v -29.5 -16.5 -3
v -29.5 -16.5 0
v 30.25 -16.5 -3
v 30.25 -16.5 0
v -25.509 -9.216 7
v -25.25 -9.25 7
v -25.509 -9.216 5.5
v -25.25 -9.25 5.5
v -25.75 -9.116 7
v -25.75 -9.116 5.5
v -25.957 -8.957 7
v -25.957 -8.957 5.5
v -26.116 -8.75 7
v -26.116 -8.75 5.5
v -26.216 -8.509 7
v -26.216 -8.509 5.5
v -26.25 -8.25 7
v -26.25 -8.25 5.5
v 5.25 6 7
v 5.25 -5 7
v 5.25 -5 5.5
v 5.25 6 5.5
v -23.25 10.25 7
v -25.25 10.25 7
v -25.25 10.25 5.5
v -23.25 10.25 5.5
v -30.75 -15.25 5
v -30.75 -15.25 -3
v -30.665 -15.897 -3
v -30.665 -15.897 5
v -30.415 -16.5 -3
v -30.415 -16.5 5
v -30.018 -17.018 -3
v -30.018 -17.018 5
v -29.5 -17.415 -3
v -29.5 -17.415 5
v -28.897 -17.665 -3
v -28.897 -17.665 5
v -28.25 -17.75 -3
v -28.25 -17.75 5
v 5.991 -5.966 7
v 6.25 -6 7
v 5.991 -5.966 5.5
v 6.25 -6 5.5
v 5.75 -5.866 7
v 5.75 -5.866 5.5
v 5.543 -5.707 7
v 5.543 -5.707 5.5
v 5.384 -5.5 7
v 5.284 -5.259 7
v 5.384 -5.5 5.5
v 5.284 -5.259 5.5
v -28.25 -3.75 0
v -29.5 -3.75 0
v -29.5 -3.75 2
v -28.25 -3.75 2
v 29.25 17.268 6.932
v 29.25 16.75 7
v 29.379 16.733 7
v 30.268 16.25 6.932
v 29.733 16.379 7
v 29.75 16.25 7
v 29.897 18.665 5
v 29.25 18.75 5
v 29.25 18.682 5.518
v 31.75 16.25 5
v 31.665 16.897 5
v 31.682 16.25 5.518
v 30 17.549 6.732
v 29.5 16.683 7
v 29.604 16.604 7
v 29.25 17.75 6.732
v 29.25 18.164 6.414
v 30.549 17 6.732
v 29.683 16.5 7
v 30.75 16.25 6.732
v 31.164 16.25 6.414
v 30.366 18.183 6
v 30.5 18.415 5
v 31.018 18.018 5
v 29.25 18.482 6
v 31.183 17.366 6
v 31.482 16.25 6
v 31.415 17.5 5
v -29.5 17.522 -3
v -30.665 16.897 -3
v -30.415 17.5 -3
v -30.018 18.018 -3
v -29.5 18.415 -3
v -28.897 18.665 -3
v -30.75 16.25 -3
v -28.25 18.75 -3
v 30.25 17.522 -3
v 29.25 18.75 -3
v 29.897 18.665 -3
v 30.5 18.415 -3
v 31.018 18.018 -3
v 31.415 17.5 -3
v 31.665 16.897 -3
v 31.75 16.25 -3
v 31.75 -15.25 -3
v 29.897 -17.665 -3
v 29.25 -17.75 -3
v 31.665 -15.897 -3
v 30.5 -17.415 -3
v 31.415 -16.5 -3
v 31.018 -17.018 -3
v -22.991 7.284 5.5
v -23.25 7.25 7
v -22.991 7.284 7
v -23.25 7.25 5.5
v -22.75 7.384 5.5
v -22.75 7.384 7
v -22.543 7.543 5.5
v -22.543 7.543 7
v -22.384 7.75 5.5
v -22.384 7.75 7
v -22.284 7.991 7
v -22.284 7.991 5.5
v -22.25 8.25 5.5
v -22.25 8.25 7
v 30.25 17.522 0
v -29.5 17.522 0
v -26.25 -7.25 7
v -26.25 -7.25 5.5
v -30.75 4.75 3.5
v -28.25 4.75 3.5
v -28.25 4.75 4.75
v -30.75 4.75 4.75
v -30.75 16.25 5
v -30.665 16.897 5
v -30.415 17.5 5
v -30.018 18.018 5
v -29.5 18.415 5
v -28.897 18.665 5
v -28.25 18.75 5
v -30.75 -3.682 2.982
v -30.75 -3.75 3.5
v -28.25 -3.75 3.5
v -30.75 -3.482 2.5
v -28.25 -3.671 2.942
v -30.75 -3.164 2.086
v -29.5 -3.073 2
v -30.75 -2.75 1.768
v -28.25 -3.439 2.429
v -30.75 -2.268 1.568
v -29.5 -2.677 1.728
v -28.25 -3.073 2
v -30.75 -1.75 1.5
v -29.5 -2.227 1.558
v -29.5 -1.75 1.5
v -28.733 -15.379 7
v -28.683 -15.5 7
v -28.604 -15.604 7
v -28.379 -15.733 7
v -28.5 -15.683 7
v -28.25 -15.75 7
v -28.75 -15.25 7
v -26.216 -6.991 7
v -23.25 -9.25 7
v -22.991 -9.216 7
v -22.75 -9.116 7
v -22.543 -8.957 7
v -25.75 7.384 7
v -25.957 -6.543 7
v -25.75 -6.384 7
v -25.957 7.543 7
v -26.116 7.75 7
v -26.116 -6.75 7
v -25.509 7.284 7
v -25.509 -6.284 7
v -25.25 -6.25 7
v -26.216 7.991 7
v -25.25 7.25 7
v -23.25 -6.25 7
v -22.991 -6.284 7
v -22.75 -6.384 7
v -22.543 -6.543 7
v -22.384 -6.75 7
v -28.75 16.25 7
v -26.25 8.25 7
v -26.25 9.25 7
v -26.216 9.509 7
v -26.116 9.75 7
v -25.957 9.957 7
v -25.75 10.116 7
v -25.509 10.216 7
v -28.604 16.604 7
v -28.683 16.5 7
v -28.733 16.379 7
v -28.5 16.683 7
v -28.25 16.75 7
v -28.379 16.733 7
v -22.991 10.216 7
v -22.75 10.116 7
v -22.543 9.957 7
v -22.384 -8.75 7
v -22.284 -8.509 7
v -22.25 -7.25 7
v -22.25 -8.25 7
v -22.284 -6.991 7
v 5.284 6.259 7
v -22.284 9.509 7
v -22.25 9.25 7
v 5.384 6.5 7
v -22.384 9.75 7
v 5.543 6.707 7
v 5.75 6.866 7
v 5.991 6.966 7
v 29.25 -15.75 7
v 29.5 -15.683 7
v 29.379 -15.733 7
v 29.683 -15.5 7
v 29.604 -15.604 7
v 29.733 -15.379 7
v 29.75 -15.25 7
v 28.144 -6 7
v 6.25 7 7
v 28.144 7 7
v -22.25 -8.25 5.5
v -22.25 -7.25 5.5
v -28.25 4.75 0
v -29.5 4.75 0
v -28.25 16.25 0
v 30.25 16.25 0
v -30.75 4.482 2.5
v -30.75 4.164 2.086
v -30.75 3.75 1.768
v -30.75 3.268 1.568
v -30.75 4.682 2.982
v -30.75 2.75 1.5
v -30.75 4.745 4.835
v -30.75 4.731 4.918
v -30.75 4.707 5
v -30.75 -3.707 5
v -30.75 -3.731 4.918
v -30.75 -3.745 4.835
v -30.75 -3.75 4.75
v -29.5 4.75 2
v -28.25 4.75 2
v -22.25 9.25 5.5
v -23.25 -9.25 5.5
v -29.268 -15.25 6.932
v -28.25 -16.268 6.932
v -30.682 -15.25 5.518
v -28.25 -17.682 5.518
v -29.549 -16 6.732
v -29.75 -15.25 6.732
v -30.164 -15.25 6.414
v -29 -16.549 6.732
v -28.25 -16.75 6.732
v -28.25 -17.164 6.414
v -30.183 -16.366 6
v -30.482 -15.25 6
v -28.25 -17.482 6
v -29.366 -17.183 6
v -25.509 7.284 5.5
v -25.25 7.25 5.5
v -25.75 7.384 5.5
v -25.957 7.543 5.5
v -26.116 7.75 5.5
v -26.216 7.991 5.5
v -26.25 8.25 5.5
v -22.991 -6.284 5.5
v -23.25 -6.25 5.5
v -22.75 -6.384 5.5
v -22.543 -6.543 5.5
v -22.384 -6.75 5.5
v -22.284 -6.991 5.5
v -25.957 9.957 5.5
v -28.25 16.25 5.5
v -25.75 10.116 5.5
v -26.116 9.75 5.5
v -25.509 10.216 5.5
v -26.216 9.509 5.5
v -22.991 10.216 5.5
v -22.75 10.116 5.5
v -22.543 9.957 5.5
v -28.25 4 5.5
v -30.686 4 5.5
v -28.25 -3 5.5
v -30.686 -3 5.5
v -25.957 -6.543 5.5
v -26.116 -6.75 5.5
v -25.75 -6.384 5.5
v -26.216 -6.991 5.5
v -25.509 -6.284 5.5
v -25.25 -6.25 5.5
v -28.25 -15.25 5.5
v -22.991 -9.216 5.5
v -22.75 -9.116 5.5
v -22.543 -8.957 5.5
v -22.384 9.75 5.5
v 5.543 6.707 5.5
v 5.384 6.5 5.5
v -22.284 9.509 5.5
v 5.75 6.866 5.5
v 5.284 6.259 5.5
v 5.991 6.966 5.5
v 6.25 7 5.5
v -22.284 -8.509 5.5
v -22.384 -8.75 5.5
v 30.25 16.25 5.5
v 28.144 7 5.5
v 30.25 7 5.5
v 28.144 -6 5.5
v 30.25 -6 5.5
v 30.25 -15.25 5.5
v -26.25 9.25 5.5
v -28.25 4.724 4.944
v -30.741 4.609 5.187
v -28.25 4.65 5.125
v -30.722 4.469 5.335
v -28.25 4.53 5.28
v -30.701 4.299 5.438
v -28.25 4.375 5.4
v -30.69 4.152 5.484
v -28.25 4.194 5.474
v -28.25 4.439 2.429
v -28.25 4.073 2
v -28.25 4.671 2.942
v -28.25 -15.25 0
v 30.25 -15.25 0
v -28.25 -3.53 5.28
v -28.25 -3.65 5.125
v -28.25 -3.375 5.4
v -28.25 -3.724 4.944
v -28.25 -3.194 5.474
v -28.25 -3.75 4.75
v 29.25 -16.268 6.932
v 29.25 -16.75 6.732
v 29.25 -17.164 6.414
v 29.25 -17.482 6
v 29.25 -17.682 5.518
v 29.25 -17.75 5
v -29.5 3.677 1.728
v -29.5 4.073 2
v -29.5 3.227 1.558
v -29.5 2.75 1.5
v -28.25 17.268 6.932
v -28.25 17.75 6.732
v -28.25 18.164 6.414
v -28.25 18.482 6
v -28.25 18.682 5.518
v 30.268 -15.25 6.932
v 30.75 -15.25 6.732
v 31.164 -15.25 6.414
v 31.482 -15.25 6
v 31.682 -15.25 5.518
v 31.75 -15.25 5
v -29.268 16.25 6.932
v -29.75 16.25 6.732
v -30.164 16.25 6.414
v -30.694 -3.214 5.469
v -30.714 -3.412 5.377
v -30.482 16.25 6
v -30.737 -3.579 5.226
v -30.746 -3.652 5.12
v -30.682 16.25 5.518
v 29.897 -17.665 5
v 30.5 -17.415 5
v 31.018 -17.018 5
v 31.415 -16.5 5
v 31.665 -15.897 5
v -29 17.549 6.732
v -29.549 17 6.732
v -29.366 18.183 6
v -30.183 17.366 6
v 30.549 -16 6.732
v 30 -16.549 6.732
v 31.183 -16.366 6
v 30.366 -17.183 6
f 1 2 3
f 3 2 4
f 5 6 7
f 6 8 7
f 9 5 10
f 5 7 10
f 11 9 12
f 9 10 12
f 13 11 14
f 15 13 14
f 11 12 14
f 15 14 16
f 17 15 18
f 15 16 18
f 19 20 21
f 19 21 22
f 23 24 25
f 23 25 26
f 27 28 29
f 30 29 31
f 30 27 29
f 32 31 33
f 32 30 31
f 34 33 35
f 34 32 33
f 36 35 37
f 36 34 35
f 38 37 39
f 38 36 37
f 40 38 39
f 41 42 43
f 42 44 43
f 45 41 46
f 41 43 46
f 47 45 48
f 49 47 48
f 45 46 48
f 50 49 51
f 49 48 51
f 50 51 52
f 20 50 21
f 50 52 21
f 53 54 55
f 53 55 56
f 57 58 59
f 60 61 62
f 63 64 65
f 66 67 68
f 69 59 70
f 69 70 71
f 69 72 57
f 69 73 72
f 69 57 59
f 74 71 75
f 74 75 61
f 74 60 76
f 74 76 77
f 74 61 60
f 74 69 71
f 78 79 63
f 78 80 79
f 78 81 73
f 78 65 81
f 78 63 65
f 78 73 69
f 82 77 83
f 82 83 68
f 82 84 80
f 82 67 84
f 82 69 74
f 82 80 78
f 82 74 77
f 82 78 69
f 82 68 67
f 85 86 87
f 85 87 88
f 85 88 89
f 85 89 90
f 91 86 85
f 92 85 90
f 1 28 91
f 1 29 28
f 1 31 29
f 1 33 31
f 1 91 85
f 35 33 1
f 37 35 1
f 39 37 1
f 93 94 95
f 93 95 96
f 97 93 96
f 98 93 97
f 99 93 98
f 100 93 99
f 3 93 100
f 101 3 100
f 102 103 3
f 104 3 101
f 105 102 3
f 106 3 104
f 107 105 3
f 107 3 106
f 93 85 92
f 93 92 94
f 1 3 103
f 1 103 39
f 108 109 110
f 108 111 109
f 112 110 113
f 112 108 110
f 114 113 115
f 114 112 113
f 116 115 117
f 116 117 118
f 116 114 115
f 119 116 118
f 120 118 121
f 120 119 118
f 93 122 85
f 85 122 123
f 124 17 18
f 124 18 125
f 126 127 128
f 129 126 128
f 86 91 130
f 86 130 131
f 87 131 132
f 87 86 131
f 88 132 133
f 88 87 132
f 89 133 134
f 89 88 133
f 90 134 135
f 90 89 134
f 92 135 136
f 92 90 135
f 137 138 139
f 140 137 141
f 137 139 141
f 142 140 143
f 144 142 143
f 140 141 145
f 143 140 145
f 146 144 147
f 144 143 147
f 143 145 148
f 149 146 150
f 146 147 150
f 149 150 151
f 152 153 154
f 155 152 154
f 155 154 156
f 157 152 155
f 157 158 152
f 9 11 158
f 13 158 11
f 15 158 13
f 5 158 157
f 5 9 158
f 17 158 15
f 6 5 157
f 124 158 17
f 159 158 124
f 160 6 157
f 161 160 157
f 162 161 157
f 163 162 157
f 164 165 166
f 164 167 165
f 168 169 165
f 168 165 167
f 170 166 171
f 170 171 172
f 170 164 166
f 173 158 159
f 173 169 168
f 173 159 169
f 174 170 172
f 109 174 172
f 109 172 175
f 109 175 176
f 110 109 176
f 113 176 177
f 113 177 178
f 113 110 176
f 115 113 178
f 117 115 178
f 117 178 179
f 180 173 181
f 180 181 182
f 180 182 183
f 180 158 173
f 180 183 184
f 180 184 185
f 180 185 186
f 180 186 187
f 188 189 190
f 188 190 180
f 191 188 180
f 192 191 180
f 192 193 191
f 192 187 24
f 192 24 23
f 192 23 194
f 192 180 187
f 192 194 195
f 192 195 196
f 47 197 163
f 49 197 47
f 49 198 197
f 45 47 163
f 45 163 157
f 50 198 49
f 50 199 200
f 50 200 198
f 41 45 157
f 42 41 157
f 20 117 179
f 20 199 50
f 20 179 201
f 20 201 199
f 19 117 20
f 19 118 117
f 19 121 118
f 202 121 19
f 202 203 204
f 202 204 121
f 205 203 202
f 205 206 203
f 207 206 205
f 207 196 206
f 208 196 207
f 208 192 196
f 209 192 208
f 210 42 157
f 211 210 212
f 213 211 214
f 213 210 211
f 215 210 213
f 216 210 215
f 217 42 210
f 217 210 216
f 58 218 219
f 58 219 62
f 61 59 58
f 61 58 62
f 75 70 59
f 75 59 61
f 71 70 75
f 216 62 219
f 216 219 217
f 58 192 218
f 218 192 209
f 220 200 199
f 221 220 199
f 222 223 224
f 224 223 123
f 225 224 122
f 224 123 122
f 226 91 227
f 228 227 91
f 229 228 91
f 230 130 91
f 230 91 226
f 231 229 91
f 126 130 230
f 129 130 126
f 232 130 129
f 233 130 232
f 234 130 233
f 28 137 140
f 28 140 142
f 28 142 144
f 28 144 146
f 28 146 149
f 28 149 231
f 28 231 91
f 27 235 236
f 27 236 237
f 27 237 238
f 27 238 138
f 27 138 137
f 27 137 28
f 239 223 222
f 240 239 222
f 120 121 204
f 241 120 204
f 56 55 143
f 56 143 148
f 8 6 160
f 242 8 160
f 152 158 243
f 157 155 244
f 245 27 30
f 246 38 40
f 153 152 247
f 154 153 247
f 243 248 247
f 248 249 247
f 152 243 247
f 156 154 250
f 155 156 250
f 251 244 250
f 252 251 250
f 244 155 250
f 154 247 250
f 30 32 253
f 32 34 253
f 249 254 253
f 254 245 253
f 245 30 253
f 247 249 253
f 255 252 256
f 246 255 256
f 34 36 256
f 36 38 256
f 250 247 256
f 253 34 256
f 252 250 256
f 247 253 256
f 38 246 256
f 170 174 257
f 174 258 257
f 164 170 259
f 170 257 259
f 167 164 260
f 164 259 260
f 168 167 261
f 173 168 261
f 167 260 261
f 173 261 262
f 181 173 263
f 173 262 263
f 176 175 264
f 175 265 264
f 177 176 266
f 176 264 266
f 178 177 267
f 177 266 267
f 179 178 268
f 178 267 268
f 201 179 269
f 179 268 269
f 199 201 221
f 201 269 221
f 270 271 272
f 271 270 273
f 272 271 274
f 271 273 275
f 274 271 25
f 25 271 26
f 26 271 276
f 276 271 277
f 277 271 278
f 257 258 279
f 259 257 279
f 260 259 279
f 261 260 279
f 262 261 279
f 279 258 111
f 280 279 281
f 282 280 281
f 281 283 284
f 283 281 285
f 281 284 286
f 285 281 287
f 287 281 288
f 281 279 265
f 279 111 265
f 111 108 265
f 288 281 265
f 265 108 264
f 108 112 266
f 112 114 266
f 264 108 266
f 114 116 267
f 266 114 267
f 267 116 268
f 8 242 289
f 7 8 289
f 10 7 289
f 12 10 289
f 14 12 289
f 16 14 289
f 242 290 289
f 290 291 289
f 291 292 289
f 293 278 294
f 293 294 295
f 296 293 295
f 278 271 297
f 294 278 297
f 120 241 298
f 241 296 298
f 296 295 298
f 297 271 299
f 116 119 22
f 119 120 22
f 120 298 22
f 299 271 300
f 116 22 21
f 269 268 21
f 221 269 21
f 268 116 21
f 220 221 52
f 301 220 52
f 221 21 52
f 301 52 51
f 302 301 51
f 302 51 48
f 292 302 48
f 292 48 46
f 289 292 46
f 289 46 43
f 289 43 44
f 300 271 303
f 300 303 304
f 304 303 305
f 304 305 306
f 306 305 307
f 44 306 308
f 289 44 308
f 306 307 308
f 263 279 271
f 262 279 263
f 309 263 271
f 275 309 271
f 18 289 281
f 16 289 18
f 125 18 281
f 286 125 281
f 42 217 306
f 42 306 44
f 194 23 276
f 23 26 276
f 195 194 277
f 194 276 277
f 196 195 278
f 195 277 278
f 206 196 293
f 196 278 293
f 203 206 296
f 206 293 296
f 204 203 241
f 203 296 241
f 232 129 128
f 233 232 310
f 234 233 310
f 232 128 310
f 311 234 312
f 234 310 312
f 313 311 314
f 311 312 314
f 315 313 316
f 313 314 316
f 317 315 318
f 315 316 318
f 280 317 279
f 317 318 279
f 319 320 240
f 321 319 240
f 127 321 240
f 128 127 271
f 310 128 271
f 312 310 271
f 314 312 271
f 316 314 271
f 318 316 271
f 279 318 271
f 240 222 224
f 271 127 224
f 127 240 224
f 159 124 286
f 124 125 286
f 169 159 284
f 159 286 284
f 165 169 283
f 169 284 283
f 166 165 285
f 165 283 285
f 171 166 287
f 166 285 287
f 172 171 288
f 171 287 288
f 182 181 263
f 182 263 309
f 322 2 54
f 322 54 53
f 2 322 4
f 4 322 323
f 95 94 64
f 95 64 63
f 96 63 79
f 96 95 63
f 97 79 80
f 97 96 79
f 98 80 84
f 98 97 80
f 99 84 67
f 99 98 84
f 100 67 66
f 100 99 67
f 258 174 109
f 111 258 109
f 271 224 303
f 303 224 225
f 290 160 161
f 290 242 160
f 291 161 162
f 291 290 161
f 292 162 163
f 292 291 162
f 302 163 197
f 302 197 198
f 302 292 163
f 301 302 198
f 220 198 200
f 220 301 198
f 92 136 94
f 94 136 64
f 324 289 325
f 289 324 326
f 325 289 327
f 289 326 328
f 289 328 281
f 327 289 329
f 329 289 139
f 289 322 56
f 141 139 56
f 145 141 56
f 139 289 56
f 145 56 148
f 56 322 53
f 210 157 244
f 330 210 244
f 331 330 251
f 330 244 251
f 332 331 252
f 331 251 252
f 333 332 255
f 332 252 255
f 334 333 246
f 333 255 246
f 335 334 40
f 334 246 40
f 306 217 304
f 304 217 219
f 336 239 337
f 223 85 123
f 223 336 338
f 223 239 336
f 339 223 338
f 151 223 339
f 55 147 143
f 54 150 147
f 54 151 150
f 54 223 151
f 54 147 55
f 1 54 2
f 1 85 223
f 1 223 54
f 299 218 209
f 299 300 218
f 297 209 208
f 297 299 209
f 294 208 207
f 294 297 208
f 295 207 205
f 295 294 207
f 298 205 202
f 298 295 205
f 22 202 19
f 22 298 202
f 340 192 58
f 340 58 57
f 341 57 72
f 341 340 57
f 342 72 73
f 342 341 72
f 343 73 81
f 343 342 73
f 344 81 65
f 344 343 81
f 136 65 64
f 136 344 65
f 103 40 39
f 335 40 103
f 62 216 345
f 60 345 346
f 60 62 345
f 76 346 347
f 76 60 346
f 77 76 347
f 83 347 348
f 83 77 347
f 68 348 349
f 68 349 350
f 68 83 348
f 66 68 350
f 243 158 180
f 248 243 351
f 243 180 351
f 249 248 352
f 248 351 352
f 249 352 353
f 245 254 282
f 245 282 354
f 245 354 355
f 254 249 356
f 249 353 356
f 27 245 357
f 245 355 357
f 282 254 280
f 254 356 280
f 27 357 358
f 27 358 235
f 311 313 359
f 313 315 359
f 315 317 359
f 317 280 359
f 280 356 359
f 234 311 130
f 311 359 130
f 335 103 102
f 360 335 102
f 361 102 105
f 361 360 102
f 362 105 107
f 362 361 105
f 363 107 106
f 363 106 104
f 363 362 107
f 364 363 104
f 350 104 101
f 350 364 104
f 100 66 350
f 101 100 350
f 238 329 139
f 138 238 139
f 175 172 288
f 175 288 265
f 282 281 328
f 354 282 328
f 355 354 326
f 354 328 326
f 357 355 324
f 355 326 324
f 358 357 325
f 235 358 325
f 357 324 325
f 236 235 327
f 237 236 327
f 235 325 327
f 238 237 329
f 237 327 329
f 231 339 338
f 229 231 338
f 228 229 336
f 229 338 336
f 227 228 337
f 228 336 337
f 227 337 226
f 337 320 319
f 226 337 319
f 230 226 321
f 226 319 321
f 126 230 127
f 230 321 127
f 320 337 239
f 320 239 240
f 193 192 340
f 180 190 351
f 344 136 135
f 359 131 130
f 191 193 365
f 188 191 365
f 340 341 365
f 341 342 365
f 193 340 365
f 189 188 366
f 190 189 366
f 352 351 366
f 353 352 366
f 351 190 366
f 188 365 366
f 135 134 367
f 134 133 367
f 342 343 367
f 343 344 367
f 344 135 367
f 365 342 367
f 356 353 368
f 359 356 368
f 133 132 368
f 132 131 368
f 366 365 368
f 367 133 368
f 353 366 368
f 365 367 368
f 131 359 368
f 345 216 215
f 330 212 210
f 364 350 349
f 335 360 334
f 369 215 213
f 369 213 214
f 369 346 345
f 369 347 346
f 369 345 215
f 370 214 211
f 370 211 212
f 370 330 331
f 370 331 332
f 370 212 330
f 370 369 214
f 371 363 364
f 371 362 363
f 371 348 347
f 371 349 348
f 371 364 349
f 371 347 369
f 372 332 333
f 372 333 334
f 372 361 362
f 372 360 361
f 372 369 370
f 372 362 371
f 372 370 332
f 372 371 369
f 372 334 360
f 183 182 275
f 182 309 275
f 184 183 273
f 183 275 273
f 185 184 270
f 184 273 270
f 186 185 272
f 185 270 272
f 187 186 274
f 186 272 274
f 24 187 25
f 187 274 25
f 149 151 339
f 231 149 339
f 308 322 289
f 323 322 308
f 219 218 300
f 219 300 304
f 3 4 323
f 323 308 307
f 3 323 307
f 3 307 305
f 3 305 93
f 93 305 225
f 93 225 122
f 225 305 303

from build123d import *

# Parameters (mm, degrees)
F0_W          = 62.5
F0_H          = 36.5
F0_W_2        = 58.5
F0_H_2        = 31.5
F1_DEPTH      = 7
F2_W          = 4
F2_H          = 3
F2_W_2        = 2.1059160829
F2_H_2        = 13
F3_DEPTH      = 1.5
F4_W          = 62.5
F4_H          = 36.5
F5_DEPTH      = 3
F7_DEPTH      = 2.5
F8_R          = 2.5
F9_R          = 1
F11_T1_DEPTH  = 57.5
F11_T3_DEPTH  = 31.5
F11_T6_ANGLE  = 90
F11_T8_ANGLE  = 90
F11_T10_ANGLE = 90
F11_T12_ANGLE = 90
F12_W         = 1.25
F12_H         = 8.5
F13_DEPTH     = 2


# Not quite as in the source:
# - a fillet or chamfer that OpenCascade refuses, or shapes differently, is made with other operations: its cross-section is extruded or revolved along the edge and cut away or added
# - two fillets or chamfers of one size are made in one step


with BuildPart() as f1:
    # F0 (on Top) → F1 (new body)
    with BuildSketch(Plane.XY):
        with Locations((0.5, 0.5)):
            Rectangle(F0_W, F0_H)
        with Locations((1, 0.5)):
            Rectangle(F0_W_2, F0_H_2, mode=Mode.SUBTRACT)
    extrude(amount=F1_DEPTH)

    # F2 (on face) → F3 (join)
    with BuildSketch(Plane.XY.offset(7)):
        Polygon((30.25, 16.25), (-28.25, 16.25), (-28.25, -15.25), (30.25, -15.25), (30.25, -6), (28.1440839171, -6), (5.25, -6), (5.25, 7), (28.1440839171, 7), (30.25, 7), align=None)
        with Locations((-24.25, -7.75)):
            Rectangle(F2_W, F2_H, mode=Mode.SUBTRACT)
        with Locations((-24.25, 8.75)):
            Rectangle(F2_W, F2_H, mode=Mode.SUBTRACT)
        with Locations((29.1970419586, 0.5)):
            Rectangle(F2_W_2, F2_H_2)
    extrude(amount=-F3_DEPTH)

    # F4 (on face) → F5 (join)
    with BuildSketch(Plane(origin=(0, 0, 0), x_dir=(1, 0, 0), z_dir=(0, 0, -1))):
        with Locations((0.5, -0.5)):
            Rectangle(F4_W, F4_H)
        Polygon((-29.5, -17.522141248), (-29.5, 16.5), (30.25, 16.5), (30.25, 15.25), (30.25, -16.25), (30.25, -17.522141248), align=None, mode=Mode.SUBTRACT)
    extrude(amount=F5_DEPTH)

    # F6 (on face) → F7 (cut)
    with BuildSketch(Plane.YZ.offset(-28.25)):
        with BuildLine():
            Line((4, 5.5), (-3, 5.5))
            ThreePointArc((-3, 5.5), (-3.5303300859, 5.2803300859), (-3.75, 4.75))
            Line((-3.75, 4.75), (-3.75, 3.5))
            ThreePointArc((-3.75, 3.5), (-3.1642135624, 2.0857864376), (-1.75, 1.5))
            Line((-1.75, 1.5), (2.75, 1.5))
            ThreePointArc((2.75, 1.5), (4.1642135624, 2.0857864376), (4.75, 3.5))
            Line((4.75, 3.5), (4.75, 4.75))
            ThreePointArc((4.75, 4.75), (4.5303300859, 5.2803300859), (4, 5.5))
        make_face()
    extrude(amount=-F7_DEPTH, mode=Mode.SUBTRACT)

    # F8
    f8_edges = [f1.edges().sort_by_distance(p)[0] for p in [
        (-30.75, 18.75, 2),
        (-30.75, -17.75, 2),
        (31.75, 18.75, 2),
        (31.75, -17.75, 2),
    ]]
    fillet(f8_edges, radius=F8_R)

    # F9
    f9_edges = [f1.edges().sort_by_distance(p)[0] for p in [
        (5.25, 7, 6.25),
        (5.25, -6, 6.25),
        (-22.25, 10.25, 6.25),
        (-22.25, 7.25, 6.25),
        (-26.25, 7.25, 6.25),
        (-26.25, 10.25, 6.25),
        (-26.25, -9.25, 6.25),
        (-26.25, -6.25, 6.25),
        (-22.25, -6.25, 6.25),
        (-22.25, -9.25, 6.25),
    ]]
    fillet(f9_edges, radius=F9_R)

    # F11: fillet of radius 2 on 8 edges, made by hand

    # F11_s2 → F11_t1 (cut)
    with BuildSketch(Plane.YZ.offset(-28.25)):
        with BuildLine():
            ThreePointArc((-15.75, 7), (-17.1642135624, 6.4142135624), (-17.75, 5))
            Line((-17.75, 5), (-17.75, 7))
            Line((-17.75, 7), (-15.75, 7))
        make_face()
        with BuildLine():
            ThreePointArc((16.75, 7), (18.1642135624, 6.4142135624), (18.75, 5))
            Line((18.75, 5), (18.75, 7))
            Line((18.75, 7), (16.75, 7))
        make_face()
    extrude(amount=F11_T1_DEPTH, mode=Mode.SUBTRACT)

    # F11_s4 → F11_t3 (cut)
    with BuildSketch(Plane.XZ.offset(-16.25)):
        with BuildLine():
            ThreePointArc((29.75, 7), (31.1642135624, 6.4142135624), (31.75, 5))
            Line((31.75, 5), (31.75, 7))
            Line((31.75, 7), (29.75, 7))
        make_face()
        with BuildLine():
            ThreePointArc((-28.75, 7), (-30.1642135624, 6.4142135624), (-30.75, 5))
            Line((-30.75, 5), (-30.75, 7))
            Line((-30.75, 7), (-28.75, 7))
        make_face()
    extrude(amount=F11_T3_DEPTH, mode=Mode.SUBTRACT)

    # F11_s5 → F11_t6 (revolve, cut)
    with BuildSketch(Plane.YZ.offset(29.25)):
        with BuildLine():
            ThreePointArc((16.75, 7), (18.1642135624, 6.4142135624), (18.75, 5))
            Line((18.75, 5), (18.75, 7))
            Line((18.75, 7), (16.75, 7))
        make_face()
    revolve(axis=Axis((29.25, 16.25, 7), (0, 0, -1)), revolution_arc=F11_T6_ANGLE, mode=Mode.SUBTRACT)

    # F11_s7 → F11_t8 (revolve, cut)
    with BuildSketch(Plane.YZ.offset(-28.25)):
        with BuildLine():
            ThreePointArc((16.75, 7), (18.1642135624, 6.4142135624), (18.75, 5))
            Line((18.75, 5), (18.75, 7))
            Line((18.75, 7), (16.75, 7))
        make_face()
    revolve(axis=Axis((-28.25, 16.25, 7), (0, 0, 1)), revolution_arc=F11_T8_ANGLE, mode=Mode.SUBTRACT)

    # F11_s9 → F11_t10 (revolve, cut)
    with BuildSketch(Plane.XZ.offset(15.25)):
        with BuildLine():
            ThreePointArc((29.75, 7), (31.1642135624, 6.4142135624), (31.75, 5))
            Line((31.75, 5), (31.75, 7))
            Line((31.75, 7), (29.75, 7))
        make_face()
    revolve(axis=Axis((29.25, -15.25, 7), (0, 0, -1)), revolution_arc=F11_T10_ANGLE, mode=Mode.SUBTRACT)

    # F11_s11 → F11_t12 (revolve, cut)
    with BuildSketch(Plane.XZ.offset(15.25)):
        with BuildLine():
            ThreePointArc((-28.75, 7), (-30.1642135624, 6.4142135624), (-30.75, 5))
            Line((-30.75, 5), (-30.75, 7))
            Line((-30.75, 7), (-28.75, 7))
        make_face()
    revolve(axis=Axis((-28.25, -15.25, 7), (0, 0, 1)), revolution_arc=F11_T12_ANGLE, mode=Mode.SUBTRACT)

    # F12 (on face) → F13 (cut)
    with BuildSketch(Plane(origin=(0, 0, 0), x_dir=(1, 0, 0), z_dir=(0, 0, -1))):
        with Locations((-28.875, -0.5)):
            Rectangle(F12_W, F12_H)
    extrude(amount=-F13_DEPTH, mode=Mode.SUBTRACT)


solid = f1.part
